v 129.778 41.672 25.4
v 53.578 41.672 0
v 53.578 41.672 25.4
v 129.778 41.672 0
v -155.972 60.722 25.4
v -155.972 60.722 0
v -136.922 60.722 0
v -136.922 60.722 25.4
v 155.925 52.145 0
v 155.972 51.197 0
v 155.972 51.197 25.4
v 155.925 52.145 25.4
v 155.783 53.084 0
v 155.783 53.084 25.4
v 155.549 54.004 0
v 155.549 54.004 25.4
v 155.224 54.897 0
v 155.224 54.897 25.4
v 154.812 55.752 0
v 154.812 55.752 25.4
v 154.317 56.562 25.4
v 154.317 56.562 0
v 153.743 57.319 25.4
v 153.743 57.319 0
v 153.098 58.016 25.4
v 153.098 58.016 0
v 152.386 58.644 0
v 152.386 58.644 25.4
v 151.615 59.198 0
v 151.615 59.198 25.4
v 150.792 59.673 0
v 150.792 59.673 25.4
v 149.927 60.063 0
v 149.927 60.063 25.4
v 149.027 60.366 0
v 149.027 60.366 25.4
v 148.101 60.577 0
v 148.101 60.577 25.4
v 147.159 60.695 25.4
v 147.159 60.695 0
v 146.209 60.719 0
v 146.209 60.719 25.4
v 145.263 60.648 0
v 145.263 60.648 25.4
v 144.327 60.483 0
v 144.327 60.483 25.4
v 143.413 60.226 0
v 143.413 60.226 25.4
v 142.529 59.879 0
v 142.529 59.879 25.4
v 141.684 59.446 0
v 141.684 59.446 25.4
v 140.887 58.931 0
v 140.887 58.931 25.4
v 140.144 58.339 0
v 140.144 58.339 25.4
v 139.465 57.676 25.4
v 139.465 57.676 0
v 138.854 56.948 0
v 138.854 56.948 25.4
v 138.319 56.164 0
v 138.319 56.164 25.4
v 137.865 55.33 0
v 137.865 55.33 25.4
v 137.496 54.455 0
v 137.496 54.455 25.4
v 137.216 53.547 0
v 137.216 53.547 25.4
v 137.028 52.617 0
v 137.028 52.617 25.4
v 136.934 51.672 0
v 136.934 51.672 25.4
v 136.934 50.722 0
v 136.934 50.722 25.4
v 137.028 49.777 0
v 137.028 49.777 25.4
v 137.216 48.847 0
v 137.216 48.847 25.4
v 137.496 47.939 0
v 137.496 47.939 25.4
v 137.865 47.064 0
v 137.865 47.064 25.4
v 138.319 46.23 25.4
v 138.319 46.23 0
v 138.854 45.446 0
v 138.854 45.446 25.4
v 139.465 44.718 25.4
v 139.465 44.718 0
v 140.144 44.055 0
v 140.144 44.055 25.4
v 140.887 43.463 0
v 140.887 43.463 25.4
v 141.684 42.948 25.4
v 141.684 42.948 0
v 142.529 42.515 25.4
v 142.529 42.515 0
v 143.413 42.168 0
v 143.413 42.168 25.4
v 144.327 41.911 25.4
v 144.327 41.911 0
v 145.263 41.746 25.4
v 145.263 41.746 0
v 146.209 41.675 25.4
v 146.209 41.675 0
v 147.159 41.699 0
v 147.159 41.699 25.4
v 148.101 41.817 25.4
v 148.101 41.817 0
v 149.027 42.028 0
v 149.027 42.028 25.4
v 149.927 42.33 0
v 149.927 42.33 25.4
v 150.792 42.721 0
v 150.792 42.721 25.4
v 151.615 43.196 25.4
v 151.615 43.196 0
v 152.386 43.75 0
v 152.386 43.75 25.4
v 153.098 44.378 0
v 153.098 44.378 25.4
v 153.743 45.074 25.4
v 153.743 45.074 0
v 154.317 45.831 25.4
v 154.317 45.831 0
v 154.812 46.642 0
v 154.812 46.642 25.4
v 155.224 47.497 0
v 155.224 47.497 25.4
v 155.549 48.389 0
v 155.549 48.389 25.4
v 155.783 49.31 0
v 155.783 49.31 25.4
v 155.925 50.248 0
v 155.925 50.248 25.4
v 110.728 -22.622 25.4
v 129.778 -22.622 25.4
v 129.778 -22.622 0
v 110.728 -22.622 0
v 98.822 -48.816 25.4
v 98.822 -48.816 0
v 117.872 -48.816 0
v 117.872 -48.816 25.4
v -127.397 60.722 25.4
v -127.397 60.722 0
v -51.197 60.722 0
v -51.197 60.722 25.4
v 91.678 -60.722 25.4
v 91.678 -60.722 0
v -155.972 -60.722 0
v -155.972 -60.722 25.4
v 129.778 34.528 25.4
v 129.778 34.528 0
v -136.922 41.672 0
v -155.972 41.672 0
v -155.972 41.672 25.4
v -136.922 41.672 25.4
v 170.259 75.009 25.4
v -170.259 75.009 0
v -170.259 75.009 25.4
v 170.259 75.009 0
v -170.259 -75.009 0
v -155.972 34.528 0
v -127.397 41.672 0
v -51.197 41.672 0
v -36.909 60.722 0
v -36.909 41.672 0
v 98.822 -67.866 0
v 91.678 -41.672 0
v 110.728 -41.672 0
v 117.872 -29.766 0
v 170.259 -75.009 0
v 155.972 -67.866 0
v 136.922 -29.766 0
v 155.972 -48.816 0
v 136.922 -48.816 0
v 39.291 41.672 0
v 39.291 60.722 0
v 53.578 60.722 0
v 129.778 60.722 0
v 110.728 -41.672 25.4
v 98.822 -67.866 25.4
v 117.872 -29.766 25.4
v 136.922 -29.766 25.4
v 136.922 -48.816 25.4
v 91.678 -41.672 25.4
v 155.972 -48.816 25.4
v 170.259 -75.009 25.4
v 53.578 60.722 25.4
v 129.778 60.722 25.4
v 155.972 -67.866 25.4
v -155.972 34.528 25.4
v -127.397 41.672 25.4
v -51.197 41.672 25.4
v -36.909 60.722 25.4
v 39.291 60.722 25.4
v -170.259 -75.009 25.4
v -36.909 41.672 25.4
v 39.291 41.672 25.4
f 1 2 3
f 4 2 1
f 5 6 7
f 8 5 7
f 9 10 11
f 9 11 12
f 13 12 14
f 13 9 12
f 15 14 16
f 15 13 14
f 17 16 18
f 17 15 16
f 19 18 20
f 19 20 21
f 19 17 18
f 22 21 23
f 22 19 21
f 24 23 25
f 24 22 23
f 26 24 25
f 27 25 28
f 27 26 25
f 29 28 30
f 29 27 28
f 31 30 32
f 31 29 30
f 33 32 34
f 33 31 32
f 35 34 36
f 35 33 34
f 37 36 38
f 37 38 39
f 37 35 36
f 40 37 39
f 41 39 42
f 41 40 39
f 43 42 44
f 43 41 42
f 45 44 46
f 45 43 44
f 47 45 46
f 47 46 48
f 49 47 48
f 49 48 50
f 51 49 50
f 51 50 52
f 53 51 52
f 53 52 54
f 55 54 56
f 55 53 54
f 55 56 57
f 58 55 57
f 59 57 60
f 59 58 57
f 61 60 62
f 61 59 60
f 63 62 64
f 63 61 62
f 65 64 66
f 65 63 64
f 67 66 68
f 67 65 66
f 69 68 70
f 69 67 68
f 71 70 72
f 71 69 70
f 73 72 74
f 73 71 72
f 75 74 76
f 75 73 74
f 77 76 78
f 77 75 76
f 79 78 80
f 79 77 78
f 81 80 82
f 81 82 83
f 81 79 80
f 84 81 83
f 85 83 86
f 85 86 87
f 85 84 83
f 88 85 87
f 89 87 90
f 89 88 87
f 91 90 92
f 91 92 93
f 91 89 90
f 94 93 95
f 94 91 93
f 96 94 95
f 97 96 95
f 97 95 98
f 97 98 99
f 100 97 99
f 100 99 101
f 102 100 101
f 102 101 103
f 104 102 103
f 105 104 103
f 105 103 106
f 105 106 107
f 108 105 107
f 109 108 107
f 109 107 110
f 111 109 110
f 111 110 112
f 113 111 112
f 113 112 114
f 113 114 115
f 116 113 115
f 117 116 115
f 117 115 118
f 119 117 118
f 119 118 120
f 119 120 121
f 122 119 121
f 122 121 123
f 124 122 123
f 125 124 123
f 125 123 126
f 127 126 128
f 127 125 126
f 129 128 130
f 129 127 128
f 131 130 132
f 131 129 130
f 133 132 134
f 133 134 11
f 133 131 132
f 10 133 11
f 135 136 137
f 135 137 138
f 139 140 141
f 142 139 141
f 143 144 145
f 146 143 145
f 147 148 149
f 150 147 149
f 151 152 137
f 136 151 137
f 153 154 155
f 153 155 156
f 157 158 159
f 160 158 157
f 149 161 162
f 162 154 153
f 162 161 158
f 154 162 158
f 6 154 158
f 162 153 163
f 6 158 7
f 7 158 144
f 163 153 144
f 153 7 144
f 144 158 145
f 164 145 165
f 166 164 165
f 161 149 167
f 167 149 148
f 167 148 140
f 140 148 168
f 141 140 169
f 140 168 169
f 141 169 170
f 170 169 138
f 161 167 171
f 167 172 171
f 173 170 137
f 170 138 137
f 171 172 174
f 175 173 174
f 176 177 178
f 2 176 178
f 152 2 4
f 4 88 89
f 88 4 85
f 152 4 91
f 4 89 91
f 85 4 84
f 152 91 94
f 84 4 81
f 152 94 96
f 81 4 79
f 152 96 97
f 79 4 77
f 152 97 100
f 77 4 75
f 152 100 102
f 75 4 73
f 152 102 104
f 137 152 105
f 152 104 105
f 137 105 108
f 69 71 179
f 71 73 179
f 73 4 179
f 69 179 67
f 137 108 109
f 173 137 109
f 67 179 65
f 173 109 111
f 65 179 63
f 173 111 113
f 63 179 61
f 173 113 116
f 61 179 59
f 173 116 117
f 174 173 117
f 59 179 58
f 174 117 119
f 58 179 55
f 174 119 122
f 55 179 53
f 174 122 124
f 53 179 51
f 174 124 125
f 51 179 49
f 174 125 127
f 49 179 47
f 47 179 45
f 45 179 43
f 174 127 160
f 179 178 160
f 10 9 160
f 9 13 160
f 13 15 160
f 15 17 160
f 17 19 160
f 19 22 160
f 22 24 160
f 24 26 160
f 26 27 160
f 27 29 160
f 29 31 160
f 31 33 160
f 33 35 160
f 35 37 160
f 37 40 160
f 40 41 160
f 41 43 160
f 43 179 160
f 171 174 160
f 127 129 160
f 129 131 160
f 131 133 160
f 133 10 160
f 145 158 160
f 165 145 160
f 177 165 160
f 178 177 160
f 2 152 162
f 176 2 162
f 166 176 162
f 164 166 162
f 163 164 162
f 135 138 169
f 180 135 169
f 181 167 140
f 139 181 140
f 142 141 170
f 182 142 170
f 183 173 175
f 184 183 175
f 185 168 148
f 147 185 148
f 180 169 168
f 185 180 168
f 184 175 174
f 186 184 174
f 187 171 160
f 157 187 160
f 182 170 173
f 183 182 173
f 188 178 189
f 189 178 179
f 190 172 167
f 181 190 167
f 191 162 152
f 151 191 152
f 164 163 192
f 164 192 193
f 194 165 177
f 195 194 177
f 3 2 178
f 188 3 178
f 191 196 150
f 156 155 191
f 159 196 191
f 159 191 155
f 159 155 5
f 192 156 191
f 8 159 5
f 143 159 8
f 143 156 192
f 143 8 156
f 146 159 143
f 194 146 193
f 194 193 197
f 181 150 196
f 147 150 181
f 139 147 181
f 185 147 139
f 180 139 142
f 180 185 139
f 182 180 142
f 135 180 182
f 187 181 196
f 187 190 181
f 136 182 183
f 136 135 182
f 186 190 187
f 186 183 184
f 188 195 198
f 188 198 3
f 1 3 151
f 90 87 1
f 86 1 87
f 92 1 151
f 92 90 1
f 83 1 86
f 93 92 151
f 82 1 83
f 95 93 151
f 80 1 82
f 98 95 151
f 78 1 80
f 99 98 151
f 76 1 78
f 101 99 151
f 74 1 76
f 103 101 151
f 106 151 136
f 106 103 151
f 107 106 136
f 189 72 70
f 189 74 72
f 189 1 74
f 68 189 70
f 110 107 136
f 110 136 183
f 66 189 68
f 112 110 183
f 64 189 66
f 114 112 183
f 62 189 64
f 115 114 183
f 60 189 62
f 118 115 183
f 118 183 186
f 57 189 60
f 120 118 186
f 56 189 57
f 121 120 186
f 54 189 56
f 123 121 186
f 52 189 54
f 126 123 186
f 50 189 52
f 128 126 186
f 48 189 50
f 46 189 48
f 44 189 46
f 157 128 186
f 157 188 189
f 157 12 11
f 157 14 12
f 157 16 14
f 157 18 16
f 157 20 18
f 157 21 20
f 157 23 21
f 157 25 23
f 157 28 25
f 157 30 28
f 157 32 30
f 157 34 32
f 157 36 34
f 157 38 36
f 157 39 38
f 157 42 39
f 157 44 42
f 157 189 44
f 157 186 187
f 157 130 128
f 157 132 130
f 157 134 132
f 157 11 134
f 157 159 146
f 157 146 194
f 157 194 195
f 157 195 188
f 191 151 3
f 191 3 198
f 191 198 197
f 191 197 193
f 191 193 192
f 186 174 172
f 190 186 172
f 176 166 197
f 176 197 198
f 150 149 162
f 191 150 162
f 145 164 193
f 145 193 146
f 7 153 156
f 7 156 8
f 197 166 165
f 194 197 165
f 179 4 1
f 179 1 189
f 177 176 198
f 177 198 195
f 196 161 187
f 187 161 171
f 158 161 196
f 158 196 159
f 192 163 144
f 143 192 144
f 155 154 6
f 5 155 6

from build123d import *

# Parameters (mm, degrees)
SKETCH_W      = 340.51875
SKETCH_H      = 150.01875
SKETCH_R      = 9.525
SKETCH_W_2    = 19.05
SKETCH_H_2    = 19.05
SKETCH_W_3    = 76.2
EXTRUDE_DEPTH = 25.4


with BuildPart() as part:
    # Sketch → Extrude (new body)
    with BuildSketch(Plane.XY):
        Rectangle(SKETCH_W, SKETCH_H)
        with Locations((146.446875, 51.196875)):
            Circle(SKETCH_R, mode=Mode.SUBTRACT)
        with Locations((-146.446875, 51.196875)):
            Rectangle(SKETCH_W_2, SKETCH_H_2, mode=Mode.SUBTRACT)
        Polygon((155.971875, -67.865625), (98.821875, -67.865625), (98.821875, -48.815625), (117.871875, -48.815625), (117.871875, -29.765625), (136.921875, -29.765625), (136.921875, -48.815625), (155.971875, -48.815625), align=None, mode=Mode.SUBTRACT)
        Polygon((-155.971875, -60.721875), (-155.971875, 34.528125), (129.778125, 34.528125), (129.778125, -22.621875), (110.728125, -22.621875), (110.728125, -41.671875), (91.678125, -41.671875), (91.678125, -60.721875), align=None, mode=Mode.SUBTRACT)
        with Locations((91.678125, 51.196875)):
            Rectangle(SKETCH_W_3, SKETCH_H_2, mode=Mode.SUBTRACT)
        with Locations((1.190625, 51.196875)):
            Rectangle(SKETCH_W_3, SKETCH_H_2, mode=Mode.SUBTRACT)
        with Locations((-89.296875, 51.196875)):
            Rectangle(SKETCH_W_3, SKETCH_H_2, mode=Mode.SUBTRACT)
    extrude(amount=EXTRUDE_DEPTH)


solid = part.part
